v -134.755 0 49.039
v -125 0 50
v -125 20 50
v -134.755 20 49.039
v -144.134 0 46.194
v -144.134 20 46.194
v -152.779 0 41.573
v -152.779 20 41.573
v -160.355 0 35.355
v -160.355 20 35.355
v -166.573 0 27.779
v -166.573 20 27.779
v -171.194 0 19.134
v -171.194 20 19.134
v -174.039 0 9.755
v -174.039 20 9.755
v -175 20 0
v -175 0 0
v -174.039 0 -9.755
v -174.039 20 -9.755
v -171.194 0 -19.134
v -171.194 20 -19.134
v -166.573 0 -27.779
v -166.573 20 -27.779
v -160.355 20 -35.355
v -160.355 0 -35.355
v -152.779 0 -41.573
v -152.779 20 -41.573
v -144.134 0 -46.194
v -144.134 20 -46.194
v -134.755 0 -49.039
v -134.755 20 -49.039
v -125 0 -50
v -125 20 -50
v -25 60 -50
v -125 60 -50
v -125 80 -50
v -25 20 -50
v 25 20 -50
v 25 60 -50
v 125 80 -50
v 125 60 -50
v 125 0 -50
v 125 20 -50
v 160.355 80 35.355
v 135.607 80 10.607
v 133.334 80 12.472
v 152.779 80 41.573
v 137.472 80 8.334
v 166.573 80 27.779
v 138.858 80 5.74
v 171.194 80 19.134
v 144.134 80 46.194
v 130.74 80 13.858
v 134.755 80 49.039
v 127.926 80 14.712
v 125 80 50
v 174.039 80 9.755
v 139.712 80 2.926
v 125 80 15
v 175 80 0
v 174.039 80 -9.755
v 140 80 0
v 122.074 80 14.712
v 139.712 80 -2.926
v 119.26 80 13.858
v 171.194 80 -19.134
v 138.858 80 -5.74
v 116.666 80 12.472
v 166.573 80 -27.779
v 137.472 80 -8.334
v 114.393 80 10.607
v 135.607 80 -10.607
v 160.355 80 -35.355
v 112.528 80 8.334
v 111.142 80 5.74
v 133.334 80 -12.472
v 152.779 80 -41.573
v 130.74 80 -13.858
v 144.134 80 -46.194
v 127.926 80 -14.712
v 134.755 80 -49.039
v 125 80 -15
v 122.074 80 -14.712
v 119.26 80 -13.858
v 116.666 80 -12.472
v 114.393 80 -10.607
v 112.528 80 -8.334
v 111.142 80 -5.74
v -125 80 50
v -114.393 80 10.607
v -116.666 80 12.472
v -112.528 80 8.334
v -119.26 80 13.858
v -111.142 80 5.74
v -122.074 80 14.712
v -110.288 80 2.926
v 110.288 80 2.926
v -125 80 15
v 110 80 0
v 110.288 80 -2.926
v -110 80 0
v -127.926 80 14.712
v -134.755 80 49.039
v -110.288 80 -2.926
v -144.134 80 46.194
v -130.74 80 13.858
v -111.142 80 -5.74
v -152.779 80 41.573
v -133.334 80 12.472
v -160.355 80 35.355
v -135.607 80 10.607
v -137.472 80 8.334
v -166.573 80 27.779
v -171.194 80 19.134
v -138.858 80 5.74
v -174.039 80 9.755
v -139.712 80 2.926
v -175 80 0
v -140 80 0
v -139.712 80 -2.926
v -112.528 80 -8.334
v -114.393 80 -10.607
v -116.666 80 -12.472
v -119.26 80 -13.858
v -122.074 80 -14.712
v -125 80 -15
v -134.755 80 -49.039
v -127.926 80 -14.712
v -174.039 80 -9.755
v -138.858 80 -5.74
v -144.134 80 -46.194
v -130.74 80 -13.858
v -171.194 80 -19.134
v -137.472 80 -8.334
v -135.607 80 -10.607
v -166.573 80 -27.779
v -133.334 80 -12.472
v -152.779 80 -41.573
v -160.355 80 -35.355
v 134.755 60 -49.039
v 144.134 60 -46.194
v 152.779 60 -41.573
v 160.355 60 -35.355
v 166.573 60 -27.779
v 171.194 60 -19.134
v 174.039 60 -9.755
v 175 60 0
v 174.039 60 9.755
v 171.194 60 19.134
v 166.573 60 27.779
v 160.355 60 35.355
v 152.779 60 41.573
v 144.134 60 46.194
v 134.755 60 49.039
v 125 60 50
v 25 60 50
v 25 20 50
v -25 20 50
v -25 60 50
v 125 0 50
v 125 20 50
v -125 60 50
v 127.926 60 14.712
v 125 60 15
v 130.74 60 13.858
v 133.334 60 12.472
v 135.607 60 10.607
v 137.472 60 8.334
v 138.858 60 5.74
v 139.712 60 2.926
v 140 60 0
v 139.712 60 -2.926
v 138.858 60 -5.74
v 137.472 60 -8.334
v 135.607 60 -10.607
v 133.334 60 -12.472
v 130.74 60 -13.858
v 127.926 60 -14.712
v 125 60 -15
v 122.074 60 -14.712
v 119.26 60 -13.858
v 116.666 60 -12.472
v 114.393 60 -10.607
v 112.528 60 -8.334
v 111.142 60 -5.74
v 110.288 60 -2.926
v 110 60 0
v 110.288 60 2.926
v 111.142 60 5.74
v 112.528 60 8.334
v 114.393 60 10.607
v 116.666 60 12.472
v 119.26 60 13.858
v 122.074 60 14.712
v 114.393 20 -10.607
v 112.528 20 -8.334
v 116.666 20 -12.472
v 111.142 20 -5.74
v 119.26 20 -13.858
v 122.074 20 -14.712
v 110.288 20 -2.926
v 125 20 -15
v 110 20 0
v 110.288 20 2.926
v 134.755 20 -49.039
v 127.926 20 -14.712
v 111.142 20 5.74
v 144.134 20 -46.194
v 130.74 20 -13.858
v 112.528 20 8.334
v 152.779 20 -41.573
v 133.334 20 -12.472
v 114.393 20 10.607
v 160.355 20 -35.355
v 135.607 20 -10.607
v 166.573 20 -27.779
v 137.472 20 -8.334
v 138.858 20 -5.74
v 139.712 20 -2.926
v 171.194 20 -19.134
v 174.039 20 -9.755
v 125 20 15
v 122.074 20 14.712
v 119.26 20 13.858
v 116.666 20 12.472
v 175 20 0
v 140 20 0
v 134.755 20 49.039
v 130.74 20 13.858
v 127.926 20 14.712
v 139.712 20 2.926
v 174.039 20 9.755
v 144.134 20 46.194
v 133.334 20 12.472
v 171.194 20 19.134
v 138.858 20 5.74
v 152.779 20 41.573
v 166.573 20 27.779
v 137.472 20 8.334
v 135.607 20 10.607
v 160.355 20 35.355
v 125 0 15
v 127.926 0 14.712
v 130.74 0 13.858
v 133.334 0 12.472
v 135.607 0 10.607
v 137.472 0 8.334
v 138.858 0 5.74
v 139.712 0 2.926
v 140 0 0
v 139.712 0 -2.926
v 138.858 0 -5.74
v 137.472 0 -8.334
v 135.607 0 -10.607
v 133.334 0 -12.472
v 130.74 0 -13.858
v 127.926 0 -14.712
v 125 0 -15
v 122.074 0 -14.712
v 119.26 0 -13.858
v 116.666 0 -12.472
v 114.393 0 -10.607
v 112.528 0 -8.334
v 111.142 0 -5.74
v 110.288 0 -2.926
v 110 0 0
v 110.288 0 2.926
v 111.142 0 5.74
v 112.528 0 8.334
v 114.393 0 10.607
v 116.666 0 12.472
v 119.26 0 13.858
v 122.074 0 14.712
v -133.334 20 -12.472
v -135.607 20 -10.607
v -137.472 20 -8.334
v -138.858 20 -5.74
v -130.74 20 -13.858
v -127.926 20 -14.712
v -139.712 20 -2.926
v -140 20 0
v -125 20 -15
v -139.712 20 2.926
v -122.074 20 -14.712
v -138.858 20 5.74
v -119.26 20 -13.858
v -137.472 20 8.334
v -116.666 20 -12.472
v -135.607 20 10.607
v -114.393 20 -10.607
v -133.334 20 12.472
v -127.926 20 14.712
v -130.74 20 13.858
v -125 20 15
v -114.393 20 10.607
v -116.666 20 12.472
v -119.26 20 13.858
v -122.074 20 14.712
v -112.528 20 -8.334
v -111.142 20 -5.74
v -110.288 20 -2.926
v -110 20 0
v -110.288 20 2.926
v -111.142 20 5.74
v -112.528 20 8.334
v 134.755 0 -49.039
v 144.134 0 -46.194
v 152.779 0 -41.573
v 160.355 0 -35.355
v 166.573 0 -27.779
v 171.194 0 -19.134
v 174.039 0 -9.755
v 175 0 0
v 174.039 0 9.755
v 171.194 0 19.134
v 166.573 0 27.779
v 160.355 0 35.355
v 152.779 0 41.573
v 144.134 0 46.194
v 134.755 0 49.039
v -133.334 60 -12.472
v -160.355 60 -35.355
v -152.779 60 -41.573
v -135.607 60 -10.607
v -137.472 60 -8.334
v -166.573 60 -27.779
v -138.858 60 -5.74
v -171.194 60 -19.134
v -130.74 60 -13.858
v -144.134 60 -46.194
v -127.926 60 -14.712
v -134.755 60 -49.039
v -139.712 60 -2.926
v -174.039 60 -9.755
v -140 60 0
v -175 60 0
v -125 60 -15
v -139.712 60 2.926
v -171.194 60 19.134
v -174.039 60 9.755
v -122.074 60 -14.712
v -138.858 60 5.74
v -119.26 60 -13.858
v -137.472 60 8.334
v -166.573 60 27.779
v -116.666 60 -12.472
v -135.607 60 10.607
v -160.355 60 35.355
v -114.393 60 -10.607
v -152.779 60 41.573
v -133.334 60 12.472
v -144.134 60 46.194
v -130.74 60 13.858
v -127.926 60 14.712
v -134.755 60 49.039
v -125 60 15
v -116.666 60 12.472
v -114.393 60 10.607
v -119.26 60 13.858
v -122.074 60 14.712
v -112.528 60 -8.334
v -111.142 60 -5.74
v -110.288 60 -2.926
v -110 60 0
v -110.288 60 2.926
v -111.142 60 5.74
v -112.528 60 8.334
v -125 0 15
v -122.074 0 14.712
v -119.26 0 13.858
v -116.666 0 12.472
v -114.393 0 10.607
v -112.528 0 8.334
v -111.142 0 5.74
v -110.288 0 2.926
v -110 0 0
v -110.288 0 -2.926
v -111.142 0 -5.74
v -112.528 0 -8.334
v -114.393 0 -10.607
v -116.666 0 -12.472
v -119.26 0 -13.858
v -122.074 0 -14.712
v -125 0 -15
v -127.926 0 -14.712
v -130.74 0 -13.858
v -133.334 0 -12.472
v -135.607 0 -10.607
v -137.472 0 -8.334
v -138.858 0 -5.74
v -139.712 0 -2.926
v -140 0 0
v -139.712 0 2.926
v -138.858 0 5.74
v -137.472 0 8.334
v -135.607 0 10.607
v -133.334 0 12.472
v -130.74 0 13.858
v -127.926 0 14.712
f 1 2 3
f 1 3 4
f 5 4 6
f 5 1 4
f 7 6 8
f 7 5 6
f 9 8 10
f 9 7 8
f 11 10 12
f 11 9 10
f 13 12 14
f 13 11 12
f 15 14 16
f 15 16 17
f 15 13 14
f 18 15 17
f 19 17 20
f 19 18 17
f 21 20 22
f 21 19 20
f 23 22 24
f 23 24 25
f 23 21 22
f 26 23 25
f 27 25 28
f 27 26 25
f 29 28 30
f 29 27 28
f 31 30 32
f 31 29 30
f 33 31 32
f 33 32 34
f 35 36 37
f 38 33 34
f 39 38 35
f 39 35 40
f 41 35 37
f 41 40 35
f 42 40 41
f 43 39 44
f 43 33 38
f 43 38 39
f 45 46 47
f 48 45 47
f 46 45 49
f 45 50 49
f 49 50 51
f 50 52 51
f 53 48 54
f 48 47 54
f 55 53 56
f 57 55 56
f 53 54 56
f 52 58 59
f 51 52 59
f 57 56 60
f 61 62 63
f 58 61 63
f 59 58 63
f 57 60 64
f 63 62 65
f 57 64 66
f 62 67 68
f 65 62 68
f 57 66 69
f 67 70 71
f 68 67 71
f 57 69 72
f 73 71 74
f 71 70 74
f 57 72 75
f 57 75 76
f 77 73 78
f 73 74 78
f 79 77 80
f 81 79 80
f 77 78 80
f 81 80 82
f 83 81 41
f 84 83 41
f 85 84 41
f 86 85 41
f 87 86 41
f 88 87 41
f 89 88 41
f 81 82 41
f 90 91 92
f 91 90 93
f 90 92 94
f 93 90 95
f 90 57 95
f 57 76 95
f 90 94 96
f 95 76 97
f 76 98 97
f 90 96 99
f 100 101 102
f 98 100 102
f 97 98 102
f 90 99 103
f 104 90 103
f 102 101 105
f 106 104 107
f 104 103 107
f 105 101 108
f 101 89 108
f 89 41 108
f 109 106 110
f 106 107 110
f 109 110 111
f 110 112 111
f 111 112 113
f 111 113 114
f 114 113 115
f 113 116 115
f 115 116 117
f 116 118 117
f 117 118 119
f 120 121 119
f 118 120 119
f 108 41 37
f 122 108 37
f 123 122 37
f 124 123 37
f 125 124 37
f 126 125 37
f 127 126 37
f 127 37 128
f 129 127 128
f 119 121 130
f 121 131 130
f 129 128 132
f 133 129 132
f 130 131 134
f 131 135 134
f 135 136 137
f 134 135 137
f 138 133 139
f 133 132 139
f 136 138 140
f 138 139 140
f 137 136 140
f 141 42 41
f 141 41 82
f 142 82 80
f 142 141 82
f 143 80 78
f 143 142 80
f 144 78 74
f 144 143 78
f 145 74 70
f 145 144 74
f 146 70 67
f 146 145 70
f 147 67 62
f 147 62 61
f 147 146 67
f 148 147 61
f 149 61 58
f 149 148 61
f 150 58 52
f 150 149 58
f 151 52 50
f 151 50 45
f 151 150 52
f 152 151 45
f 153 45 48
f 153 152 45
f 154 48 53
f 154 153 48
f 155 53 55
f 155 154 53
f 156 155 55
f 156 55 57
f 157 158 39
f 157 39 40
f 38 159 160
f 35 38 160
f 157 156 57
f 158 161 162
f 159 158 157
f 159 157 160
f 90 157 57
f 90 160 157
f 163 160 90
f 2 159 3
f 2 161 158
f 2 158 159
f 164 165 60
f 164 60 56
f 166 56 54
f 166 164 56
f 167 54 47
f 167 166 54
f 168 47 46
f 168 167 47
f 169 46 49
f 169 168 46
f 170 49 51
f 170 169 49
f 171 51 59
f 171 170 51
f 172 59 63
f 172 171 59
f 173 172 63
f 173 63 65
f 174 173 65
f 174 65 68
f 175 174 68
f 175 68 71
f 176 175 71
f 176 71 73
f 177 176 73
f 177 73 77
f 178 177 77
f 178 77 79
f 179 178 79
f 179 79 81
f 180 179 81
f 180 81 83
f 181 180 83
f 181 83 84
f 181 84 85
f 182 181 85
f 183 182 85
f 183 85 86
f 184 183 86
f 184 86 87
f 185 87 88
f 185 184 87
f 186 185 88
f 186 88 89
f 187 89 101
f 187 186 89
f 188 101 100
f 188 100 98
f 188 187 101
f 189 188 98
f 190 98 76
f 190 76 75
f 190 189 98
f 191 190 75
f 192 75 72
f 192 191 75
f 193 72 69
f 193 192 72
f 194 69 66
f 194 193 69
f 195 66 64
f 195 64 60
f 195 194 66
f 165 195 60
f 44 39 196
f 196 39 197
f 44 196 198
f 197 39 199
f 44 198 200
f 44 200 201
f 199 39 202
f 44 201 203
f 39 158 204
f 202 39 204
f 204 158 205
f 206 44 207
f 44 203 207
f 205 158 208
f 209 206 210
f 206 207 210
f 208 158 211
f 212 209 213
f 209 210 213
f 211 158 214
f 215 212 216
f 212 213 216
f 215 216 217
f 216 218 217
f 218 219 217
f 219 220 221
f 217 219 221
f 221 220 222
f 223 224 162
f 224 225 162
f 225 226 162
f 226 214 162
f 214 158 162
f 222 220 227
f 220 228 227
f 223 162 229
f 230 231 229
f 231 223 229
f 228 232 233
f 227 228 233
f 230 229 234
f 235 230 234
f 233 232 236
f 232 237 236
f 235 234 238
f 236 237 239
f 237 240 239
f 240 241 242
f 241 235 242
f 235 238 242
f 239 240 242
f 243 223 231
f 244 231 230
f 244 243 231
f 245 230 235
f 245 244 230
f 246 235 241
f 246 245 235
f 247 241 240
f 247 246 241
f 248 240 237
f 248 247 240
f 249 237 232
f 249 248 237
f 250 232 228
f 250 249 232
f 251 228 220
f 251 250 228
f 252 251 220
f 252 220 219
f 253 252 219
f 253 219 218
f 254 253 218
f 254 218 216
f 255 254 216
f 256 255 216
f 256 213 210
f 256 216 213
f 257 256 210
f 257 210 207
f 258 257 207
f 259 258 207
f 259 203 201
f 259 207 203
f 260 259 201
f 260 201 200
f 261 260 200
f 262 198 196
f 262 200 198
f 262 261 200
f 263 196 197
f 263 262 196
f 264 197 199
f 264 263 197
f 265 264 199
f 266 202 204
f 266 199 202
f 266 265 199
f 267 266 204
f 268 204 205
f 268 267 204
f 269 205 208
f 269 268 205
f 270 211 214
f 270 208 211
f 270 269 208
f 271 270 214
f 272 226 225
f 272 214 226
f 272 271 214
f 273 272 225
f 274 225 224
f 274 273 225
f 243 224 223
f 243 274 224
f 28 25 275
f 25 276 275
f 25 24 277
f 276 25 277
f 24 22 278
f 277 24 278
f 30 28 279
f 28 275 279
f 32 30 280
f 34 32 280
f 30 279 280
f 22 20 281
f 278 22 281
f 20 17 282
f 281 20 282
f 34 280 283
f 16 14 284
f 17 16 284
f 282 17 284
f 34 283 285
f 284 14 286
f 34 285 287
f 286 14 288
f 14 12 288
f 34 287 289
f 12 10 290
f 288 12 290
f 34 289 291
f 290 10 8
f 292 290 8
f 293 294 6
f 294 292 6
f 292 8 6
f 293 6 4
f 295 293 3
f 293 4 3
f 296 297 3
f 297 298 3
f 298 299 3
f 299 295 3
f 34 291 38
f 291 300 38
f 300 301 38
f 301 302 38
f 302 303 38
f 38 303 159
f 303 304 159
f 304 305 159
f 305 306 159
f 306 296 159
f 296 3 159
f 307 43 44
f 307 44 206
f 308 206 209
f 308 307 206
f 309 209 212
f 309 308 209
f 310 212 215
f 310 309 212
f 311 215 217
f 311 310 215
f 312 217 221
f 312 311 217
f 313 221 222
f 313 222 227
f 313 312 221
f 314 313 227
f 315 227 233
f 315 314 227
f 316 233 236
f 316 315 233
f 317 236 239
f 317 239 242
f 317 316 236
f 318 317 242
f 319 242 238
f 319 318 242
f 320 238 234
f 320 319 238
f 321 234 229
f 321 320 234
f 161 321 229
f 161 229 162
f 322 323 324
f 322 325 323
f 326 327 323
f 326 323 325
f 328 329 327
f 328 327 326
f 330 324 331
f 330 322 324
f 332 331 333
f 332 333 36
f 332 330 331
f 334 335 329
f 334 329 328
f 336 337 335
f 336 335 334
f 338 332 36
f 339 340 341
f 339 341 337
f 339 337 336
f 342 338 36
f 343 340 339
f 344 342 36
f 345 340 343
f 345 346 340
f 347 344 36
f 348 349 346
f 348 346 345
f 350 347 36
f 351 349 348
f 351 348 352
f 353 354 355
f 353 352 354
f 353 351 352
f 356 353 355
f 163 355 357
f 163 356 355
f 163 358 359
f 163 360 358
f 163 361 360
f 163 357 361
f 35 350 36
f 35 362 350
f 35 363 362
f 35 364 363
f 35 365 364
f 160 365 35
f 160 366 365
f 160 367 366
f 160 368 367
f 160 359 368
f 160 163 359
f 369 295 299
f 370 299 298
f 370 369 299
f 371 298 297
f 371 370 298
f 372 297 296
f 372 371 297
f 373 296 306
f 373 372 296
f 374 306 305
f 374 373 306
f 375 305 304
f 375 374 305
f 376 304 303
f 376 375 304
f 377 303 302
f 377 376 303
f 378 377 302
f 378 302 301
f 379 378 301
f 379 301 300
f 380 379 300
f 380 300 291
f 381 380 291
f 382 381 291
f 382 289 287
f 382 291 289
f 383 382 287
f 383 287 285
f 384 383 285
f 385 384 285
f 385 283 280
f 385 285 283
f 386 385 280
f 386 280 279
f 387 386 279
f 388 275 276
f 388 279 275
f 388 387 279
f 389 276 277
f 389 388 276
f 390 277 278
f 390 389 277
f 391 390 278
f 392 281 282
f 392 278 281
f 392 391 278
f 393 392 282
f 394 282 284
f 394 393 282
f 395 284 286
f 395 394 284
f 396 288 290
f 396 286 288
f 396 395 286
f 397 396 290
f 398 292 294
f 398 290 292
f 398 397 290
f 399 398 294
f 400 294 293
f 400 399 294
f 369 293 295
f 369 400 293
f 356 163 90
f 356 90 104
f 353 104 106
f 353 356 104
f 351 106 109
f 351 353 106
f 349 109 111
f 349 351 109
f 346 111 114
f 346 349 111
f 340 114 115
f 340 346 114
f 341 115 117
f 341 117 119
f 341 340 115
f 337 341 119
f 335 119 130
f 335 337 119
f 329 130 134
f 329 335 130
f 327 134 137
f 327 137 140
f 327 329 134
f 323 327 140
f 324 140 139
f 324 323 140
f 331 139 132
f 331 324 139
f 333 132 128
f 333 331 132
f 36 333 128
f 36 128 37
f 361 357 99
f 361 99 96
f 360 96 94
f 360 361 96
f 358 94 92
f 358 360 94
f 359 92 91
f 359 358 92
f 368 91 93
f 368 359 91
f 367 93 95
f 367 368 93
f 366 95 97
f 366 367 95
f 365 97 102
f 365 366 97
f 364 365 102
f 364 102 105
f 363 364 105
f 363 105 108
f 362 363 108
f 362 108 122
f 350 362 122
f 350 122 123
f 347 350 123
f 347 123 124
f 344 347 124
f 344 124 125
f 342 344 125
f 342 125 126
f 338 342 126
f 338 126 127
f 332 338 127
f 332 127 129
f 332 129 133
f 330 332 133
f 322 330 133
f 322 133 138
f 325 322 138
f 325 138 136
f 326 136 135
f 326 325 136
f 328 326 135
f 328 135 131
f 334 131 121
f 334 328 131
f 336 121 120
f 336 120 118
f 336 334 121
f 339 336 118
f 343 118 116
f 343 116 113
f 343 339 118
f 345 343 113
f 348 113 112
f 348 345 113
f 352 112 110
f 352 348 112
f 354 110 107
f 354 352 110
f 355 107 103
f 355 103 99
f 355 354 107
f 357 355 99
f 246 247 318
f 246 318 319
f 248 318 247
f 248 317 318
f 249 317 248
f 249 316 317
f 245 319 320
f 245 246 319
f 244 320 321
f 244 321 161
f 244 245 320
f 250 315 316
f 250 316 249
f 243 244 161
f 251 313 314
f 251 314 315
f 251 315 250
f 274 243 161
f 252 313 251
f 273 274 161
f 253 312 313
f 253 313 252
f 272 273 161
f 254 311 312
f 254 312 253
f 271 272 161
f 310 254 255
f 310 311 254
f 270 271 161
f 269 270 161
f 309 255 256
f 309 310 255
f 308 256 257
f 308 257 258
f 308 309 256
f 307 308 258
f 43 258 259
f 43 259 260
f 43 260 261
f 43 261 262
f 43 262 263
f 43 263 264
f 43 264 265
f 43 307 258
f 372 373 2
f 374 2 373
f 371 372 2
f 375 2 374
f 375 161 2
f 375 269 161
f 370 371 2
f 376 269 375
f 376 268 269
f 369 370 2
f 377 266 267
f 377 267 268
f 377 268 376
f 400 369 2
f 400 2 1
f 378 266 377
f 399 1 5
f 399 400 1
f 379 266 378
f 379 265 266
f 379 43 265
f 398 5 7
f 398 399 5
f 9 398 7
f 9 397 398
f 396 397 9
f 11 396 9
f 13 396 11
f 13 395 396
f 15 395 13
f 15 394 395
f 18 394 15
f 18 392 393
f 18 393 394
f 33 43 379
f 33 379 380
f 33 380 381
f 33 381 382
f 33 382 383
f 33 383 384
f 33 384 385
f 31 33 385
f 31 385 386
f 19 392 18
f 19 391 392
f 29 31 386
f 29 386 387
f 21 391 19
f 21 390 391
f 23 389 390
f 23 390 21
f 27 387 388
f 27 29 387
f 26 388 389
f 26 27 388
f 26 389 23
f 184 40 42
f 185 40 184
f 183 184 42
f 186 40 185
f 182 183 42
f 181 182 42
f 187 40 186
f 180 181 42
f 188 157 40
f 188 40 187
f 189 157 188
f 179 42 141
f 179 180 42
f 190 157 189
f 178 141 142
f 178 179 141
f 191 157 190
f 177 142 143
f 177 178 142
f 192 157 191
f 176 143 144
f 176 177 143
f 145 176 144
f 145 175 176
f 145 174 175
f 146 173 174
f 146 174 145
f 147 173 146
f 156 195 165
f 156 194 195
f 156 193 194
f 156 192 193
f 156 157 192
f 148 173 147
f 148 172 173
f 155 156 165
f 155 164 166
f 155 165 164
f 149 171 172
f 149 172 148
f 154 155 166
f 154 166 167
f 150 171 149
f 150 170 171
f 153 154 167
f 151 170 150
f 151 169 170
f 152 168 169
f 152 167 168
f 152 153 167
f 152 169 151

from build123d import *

# Parameters (mm, degrees)
SKETCH_1_R          = 15
EXTRUDE_1_DEPTH     = 80
SKETCH_2_W          = 200
SKETCH_2_H          = 40
CUT_EXTRUDE_1_DEPTH = 125


with BuildPart() as part:
    # 草图1 → 凸台-拉伸1 (new body)
    with BuildSketch(Plane(origin=(0, 0, 0), x_dir=(1, 0, 0), z_dir=(0, 1, 0))):
        with BuildLine():
            Line((-125, 50), (125, 50))
            ThreePointArc((125, 50), (175, 0), (125, -50))
            Line((125, -50), (-125, -50))
            ThreePointArc((-125, -50), (-175, 0), (-125, 50))
        make_face()
        with Locations(Location((-125, 0, 0), (0, 0, 270))):
            Circle(SKETCH_1_R, mode=Mode.SUBTRACT)
        with Locations(Location((125, 0, 0), (0, 0, 270))):
            Circle(SKETCH_1_R, mode=Mode.SUBTRACT)
    extrude(amount=EXTRUDE_1_DEPTH)

    # 草图2 → 切除-拉伸1 (cut)
    with BuildSketch(Plane.XY.offset(50)):
        with Locations((-125, 40)):
            Rectangle(SKETCH_2_W, SKETCH_2_H)
        with Locations((125, 40)):
            Rectangle(SKETCH_2_W, SKETCH_2_H)
    extrude(amount=-CUT_EXTRUDE_1_DEPTH, mode=Mode.SUBTRACT)


solid = part.part
